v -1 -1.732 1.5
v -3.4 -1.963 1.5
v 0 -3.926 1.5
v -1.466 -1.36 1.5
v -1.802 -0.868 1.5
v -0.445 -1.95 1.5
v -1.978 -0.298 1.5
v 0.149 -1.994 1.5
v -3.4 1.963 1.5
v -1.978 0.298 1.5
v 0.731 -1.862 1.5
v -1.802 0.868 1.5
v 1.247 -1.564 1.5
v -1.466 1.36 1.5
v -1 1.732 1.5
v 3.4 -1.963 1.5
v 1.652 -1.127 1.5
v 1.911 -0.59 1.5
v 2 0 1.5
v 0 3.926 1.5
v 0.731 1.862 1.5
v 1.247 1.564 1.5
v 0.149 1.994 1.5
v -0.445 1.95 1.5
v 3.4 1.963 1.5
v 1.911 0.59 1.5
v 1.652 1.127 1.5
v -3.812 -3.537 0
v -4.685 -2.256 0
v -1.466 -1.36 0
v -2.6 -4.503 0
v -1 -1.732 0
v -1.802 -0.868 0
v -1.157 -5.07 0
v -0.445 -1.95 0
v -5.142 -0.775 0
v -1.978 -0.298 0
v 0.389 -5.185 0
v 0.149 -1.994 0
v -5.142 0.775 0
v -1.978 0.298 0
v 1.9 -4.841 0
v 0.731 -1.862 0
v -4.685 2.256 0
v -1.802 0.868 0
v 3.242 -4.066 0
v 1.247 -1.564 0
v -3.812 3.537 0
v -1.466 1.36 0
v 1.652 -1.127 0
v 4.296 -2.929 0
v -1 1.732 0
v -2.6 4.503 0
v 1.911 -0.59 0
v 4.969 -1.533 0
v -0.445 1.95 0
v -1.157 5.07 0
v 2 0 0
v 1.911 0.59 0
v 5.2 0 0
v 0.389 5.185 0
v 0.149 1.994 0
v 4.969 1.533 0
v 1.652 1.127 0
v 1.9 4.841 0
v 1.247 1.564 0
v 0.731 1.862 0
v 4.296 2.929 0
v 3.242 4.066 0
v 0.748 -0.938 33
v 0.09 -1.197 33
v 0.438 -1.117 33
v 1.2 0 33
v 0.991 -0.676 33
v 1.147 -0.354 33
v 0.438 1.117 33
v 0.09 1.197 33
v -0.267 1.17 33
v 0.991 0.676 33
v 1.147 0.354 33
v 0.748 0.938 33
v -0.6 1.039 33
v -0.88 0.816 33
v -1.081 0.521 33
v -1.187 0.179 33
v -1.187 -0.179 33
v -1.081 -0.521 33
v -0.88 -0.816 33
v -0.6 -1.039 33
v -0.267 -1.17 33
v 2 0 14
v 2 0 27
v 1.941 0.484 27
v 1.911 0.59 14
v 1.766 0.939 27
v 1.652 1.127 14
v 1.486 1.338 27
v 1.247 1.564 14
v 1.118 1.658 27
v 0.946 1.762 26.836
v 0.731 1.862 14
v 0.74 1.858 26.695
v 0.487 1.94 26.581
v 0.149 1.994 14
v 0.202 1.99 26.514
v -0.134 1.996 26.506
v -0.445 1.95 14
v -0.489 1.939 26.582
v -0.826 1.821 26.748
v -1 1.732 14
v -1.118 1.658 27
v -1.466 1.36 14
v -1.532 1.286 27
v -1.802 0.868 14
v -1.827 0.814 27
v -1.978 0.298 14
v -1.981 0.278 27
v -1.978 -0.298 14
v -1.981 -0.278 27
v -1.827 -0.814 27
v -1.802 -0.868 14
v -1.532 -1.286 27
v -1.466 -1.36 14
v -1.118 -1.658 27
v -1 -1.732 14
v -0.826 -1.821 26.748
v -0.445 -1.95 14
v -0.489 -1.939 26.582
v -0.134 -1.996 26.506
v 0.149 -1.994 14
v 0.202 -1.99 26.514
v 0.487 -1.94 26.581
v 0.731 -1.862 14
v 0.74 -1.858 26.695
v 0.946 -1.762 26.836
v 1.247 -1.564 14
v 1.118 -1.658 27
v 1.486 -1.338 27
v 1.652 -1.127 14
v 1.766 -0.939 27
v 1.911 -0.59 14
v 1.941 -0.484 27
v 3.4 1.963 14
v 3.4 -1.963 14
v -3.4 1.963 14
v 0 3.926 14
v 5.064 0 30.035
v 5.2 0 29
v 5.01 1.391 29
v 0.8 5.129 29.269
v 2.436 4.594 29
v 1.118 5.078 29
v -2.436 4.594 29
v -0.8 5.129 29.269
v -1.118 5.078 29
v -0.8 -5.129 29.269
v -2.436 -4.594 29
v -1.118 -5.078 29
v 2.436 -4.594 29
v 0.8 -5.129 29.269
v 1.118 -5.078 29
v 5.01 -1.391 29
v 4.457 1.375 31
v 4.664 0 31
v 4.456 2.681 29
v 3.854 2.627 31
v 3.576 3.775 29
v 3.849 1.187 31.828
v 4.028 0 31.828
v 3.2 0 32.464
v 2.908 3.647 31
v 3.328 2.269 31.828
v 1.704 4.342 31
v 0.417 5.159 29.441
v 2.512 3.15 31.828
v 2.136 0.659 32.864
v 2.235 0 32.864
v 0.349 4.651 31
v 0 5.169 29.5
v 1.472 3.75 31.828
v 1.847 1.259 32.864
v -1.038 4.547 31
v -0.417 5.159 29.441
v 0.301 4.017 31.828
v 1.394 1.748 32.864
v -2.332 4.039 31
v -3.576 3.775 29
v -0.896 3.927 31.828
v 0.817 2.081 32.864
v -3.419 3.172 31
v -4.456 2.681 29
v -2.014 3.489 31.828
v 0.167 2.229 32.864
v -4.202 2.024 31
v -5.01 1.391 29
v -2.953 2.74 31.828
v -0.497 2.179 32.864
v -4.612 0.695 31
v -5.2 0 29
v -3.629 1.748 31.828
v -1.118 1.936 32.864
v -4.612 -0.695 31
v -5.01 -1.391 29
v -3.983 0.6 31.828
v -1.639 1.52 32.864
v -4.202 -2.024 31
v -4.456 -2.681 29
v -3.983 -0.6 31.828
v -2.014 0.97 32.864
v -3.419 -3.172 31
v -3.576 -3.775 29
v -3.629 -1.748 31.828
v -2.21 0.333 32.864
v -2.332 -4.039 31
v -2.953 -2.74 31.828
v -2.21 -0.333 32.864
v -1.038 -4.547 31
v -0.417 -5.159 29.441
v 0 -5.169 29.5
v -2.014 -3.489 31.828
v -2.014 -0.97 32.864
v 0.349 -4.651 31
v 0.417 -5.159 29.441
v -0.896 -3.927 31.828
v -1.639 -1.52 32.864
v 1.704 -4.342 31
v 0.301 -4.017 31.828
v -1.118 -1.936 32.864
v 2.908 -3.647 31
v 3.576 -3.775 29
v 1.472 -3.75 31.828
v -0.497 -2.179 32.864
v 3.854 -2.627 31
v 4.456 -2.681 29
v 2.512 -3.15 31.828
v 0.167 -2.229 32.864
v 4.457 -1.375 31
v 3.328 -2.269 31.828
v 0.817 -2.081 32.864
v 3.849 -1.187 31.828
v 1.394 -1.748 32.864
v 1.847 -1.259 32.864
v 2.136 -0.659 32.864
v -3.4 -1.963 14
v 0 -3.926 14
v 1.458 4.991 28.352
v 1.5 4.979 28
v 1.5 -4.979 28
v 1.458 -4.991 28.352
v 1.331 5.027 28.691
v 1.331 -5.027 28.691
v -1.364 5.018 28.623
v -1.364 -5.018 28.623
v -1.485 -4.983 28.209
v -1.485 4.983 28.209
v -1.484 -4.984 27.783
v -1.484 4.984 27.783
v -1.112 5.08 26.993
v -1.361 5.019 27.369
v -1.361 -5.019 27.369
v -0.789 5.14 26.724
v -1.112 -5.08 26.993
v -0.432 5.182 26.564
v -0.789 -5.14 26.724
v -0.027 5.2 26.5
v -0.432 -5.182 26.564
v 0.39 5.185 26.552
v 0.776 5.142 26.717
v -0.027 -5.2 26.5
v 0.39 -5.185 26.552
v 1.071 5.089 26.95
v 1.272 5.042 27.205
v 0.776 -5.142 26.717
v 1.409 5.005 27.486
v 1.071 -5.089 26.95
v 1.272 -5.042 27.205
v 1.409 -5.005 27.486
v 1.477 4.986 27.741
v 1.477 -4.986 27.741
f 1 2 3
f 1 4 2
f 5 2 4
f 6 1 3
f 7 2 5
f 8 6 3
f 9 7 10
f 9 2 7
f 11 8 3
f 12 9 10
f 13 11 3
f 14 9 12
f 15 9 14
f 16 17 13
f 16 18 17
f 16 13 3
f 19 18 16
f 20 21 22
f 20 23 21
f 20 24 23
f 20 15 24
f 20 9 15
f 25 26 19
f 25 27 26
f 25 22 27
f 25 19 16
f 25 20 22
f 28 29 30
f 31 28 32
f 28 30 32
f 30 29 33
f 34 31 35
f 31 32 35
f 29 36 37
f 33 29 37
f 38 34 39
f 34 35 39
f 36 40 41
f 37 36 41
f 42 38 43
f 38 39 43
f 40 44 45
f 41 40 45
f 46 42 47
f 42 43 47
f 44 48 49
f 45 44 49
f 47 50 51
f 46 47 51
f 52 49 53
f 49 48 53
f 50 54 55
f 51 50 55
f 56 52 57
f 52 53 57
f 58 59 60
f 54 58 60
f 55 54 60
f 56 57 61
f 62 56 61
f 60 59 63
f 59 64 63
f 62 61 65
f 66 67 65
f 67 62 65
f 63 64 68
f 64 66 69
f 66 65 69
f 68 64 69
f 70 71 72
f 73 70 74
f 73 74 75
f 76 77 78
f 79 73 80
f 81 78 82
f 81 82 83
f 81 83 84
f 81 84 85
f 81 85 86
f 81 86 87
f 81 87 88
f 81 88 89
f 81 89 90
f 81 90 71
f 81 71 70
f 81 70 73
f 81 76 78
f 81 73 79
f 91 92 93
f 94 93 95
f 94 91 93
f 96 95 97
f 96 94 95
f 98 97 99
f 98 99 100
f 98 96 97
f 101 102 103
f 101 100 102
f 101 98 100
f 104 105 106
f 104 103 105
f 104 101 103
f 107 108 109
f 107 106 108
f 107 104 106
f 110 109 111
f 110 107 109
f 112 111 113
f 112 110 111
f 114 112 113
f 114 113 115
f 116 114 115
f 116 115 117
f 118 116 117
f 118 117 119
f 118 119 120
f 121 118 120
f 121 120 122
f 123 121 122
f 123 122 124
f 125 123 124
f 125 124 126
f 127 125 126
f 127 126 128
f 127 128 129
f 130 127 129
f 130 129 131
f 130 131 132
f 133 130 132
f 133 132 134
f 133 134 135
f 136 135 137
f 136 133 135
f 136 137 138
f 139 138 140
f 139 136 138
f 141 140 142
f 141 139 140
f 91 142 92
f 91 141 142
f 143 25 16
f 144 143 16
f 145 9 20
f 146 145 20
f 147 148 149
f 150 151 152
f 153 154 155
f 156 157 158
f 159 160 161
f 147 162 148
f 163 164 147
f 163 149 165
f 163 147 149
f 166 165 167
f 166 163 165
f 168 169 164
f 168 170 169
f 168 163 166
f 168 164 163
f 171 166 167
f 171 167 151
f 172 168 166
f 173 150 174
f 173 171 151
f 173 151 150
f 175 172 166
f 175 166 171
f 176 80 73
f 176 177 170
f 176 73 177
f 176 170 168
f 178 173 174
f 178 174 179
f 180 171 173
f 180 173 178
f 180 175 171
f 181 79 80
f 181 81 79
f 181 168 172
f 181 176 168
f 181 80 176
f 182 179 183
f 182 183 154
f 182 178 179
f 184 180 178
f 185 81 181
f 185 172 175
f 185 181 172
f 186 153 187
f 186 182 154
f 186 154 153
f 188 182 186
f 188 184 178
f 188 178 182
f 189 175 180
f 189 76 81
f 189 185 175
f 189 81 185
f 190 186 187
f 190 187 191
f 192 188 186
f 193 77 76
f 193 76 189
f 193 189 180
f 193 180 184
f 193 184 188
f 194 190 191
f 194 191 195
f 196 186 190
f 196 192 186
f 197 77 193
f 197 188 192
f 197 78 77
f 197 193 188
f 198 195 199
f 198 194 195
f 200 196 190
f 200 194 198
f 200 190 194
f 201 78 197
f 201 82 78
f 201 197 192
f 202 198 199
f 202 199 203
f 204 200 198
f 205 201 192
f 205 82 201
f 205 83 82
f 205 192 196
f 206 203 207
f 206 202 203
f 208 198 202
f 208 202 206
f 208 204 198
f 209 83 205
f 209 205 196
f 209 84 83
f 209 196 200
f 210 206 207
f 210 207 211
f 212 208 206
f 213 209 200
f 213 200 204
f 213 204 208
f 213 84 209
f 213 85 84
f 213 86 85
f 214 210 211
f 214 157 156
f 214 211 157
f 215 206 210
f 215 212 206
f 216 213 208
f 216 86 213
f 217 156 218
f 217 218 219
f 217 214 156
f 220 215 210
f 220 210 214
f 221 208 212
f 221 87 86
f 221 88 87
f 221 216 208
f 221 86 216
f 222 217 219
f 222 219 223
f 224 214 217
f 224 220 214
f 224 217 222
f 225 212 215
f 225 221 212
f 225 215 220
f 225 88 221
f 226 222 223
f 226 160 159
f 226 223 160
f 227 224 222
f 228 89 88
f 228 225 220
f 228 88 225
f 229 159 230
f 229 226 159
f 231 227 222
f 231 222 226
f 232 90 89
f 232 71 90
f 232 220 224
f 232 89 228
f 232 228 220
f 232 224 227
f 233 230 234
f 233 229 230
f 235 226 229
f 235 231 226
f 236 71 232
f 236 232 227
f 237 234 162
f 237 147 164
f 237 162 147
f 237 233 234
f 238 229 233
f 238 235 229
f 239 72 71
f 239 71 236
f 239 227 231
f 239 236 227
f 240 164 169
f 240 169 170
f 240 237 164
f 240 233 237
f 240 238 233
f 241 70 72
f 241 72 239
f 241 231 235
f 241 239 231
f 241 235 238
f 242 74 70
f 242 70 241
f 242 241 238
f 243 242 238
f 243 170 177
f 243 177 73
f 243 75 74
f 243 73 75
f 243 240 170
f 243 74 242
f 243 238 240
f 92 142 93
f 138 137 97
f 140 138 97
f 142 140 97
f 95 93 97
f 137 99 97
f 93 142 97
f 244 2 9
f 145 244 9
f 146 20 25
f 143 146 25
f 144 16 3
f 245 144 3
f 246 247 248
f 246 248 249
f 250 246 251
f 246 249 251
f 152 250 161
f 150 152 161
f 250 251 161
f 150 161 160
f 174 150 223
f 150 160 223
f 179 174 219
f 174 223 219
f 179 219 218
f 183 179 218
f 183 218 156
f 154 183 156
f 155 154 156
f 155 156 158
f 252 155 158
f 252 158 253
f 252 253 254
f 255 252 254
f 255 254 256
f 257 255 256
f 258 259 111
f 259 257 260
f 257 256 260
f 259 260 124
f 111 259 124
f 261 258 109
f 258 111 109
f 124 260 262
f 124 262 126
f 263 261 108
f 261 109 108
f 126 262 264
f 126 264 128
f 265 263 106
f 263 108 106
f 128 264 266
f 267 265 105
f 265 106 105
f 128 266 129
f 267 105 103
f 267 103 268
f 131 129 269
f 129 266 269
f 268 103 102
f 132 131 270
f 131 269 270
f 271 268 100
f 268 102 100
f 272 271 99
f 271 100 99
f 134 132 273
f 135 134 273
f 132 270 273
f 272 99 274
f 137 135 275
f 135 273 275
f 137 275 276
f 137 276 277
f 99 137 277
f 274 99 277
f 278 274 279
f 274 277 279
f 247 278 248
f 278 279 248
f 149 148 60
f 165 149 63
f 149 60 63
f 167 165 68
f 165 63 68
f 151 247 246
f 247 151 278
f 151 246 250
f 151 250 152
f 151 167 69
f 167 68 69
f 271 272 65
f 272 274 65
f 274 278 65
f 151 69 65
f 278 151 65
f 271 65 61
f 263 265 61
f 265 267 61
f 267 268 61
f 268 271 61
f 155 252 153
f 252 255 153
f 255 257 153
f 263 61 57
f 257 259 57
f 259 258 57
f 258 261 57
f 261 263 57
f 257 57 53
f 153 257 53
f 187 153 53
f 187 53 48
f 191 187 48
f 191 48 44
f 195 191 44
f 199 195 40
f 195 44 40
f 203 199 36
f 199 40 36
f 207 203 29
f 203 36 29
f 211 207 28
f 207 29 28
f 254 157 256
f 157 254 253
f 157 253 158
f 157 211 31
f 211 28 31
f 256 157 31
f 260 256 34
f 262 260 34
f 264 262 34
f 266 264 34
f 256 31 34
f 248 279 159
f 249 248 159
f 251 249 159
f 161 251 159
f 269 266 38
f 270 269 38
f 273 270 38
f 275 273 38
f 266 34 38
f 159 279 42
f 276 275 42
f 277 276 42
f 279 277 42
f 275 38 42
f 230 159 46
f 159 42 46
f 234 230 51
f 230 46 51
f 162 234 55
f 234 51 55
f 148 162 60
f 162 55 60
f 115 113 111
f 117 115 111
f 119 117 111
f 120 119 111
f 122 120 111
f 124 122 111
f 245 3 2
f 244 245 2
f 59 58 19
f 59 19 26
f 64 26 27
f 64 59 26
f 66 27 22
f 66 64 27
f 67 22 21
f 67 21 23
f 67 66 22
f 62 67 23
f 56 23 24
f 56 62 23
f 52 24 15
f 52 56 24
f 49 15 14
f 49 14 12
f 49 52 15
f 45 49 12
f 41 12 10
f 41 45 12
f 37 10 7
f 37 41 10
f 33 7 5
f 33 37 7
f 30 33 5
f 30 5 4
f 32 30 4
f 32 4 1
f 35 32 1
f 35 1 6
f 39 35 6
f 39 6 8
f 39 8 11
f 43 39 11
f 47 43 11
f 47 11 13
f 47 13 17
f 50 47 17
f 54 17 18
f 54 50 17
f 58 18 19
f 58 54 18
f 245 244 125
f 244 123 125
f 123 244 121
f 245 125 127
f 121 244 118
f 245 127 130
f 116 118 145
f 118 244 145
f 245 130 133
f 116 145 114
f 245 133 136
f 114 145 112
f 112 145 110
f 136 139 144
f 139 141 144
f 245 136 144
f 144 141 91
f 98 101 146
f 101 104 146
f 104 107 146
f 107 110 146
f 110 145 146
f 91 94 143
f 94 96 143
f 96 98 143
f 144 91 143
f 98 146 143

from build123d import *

# Parameters (mm, degrees)
F0_R      = 5.2
F0_R_2    = 2
F1_DEPTH  = 1.5
F2_R      = 5.2
F3_DEPTH  = 12.5
F4_R      = 5.2
F4_R_2    = 2
F5_DEPTH  = 13
F6_R      = 5.2
F7_DEPTH  = 6
F8_R      = 4
F9_R      = 1.5
F10_DEPTH = 12.5


with BuildPart() as f1:
    # F0 (on Top) → F1 (new body)
    with BuildSketch(Plane.XY):
        Circle(F0_R)
        Circle(F0_R_2, mode=Mode.SUBTRACT)
    extrude(amount=F1_DEPTH)

    # F2 (on face) → F3 (join)
    with BuildSketch(Plane.XY.offset(1.5)):
        Circle(F2_R)
        Polygon((0, 3.9259818305), (3.4, 1.9629909152), (3.4, -1.9629909152), (0, -3.9259818305), (-3.4, -1.9629909152), (-3.4, 1.9629909152), align=None, mode=Mode.SUBTRACT)
    extrude(amount=F3_DEPTH)

    # F4 (on face) → F5 (join)
    with BuildSketch(Plane.XY.offset(14)):
        Circle(F4_R)
        Polygon((-3.4, -1.9629909152), (-3.4, 1.9629909152), (0, 3.9259818305), (3.4, 1.9629909152), (3.4, -1.9629909152), (0, -3.9259818305), align=None, mode=Mode.SUBTRACT)
        Polygon((0, 3.9259818305), (-3.4, 1.9629909152), (-3.4, -1.9629909152), (0, -3.9259818305), (3.4, -1.9629909152), (3.4, 1.9629909152), align=None)
        Circle(F4_R_2, mode=Mode.SUBTRACT)
    extrude(amount=F5_DEPTH)

    # F6 (on face) → F7 (join)
    with BuildSketch(Plane.XY.offset(27)):
        Circle(F6_R)
    extrude(amount=F7_DEPTH)

    # F8
    f8_edges = [f1.edges().sort_by_distance(p)[0] for p in [
        (-5.2, 0, 33),
    ]]
    fillet(f8_edges, radius=F8_R)

    # F9 (on Front) → F10 (cut, symmetric)
    with BuildSketch(Plane.XZ):
        with Locations((0, 28)):
            Circle(F9_R)
    extrude(amount=F10_DEPTH, both=True, mode=Mode.SUBTRACT)


solid = f1.part
